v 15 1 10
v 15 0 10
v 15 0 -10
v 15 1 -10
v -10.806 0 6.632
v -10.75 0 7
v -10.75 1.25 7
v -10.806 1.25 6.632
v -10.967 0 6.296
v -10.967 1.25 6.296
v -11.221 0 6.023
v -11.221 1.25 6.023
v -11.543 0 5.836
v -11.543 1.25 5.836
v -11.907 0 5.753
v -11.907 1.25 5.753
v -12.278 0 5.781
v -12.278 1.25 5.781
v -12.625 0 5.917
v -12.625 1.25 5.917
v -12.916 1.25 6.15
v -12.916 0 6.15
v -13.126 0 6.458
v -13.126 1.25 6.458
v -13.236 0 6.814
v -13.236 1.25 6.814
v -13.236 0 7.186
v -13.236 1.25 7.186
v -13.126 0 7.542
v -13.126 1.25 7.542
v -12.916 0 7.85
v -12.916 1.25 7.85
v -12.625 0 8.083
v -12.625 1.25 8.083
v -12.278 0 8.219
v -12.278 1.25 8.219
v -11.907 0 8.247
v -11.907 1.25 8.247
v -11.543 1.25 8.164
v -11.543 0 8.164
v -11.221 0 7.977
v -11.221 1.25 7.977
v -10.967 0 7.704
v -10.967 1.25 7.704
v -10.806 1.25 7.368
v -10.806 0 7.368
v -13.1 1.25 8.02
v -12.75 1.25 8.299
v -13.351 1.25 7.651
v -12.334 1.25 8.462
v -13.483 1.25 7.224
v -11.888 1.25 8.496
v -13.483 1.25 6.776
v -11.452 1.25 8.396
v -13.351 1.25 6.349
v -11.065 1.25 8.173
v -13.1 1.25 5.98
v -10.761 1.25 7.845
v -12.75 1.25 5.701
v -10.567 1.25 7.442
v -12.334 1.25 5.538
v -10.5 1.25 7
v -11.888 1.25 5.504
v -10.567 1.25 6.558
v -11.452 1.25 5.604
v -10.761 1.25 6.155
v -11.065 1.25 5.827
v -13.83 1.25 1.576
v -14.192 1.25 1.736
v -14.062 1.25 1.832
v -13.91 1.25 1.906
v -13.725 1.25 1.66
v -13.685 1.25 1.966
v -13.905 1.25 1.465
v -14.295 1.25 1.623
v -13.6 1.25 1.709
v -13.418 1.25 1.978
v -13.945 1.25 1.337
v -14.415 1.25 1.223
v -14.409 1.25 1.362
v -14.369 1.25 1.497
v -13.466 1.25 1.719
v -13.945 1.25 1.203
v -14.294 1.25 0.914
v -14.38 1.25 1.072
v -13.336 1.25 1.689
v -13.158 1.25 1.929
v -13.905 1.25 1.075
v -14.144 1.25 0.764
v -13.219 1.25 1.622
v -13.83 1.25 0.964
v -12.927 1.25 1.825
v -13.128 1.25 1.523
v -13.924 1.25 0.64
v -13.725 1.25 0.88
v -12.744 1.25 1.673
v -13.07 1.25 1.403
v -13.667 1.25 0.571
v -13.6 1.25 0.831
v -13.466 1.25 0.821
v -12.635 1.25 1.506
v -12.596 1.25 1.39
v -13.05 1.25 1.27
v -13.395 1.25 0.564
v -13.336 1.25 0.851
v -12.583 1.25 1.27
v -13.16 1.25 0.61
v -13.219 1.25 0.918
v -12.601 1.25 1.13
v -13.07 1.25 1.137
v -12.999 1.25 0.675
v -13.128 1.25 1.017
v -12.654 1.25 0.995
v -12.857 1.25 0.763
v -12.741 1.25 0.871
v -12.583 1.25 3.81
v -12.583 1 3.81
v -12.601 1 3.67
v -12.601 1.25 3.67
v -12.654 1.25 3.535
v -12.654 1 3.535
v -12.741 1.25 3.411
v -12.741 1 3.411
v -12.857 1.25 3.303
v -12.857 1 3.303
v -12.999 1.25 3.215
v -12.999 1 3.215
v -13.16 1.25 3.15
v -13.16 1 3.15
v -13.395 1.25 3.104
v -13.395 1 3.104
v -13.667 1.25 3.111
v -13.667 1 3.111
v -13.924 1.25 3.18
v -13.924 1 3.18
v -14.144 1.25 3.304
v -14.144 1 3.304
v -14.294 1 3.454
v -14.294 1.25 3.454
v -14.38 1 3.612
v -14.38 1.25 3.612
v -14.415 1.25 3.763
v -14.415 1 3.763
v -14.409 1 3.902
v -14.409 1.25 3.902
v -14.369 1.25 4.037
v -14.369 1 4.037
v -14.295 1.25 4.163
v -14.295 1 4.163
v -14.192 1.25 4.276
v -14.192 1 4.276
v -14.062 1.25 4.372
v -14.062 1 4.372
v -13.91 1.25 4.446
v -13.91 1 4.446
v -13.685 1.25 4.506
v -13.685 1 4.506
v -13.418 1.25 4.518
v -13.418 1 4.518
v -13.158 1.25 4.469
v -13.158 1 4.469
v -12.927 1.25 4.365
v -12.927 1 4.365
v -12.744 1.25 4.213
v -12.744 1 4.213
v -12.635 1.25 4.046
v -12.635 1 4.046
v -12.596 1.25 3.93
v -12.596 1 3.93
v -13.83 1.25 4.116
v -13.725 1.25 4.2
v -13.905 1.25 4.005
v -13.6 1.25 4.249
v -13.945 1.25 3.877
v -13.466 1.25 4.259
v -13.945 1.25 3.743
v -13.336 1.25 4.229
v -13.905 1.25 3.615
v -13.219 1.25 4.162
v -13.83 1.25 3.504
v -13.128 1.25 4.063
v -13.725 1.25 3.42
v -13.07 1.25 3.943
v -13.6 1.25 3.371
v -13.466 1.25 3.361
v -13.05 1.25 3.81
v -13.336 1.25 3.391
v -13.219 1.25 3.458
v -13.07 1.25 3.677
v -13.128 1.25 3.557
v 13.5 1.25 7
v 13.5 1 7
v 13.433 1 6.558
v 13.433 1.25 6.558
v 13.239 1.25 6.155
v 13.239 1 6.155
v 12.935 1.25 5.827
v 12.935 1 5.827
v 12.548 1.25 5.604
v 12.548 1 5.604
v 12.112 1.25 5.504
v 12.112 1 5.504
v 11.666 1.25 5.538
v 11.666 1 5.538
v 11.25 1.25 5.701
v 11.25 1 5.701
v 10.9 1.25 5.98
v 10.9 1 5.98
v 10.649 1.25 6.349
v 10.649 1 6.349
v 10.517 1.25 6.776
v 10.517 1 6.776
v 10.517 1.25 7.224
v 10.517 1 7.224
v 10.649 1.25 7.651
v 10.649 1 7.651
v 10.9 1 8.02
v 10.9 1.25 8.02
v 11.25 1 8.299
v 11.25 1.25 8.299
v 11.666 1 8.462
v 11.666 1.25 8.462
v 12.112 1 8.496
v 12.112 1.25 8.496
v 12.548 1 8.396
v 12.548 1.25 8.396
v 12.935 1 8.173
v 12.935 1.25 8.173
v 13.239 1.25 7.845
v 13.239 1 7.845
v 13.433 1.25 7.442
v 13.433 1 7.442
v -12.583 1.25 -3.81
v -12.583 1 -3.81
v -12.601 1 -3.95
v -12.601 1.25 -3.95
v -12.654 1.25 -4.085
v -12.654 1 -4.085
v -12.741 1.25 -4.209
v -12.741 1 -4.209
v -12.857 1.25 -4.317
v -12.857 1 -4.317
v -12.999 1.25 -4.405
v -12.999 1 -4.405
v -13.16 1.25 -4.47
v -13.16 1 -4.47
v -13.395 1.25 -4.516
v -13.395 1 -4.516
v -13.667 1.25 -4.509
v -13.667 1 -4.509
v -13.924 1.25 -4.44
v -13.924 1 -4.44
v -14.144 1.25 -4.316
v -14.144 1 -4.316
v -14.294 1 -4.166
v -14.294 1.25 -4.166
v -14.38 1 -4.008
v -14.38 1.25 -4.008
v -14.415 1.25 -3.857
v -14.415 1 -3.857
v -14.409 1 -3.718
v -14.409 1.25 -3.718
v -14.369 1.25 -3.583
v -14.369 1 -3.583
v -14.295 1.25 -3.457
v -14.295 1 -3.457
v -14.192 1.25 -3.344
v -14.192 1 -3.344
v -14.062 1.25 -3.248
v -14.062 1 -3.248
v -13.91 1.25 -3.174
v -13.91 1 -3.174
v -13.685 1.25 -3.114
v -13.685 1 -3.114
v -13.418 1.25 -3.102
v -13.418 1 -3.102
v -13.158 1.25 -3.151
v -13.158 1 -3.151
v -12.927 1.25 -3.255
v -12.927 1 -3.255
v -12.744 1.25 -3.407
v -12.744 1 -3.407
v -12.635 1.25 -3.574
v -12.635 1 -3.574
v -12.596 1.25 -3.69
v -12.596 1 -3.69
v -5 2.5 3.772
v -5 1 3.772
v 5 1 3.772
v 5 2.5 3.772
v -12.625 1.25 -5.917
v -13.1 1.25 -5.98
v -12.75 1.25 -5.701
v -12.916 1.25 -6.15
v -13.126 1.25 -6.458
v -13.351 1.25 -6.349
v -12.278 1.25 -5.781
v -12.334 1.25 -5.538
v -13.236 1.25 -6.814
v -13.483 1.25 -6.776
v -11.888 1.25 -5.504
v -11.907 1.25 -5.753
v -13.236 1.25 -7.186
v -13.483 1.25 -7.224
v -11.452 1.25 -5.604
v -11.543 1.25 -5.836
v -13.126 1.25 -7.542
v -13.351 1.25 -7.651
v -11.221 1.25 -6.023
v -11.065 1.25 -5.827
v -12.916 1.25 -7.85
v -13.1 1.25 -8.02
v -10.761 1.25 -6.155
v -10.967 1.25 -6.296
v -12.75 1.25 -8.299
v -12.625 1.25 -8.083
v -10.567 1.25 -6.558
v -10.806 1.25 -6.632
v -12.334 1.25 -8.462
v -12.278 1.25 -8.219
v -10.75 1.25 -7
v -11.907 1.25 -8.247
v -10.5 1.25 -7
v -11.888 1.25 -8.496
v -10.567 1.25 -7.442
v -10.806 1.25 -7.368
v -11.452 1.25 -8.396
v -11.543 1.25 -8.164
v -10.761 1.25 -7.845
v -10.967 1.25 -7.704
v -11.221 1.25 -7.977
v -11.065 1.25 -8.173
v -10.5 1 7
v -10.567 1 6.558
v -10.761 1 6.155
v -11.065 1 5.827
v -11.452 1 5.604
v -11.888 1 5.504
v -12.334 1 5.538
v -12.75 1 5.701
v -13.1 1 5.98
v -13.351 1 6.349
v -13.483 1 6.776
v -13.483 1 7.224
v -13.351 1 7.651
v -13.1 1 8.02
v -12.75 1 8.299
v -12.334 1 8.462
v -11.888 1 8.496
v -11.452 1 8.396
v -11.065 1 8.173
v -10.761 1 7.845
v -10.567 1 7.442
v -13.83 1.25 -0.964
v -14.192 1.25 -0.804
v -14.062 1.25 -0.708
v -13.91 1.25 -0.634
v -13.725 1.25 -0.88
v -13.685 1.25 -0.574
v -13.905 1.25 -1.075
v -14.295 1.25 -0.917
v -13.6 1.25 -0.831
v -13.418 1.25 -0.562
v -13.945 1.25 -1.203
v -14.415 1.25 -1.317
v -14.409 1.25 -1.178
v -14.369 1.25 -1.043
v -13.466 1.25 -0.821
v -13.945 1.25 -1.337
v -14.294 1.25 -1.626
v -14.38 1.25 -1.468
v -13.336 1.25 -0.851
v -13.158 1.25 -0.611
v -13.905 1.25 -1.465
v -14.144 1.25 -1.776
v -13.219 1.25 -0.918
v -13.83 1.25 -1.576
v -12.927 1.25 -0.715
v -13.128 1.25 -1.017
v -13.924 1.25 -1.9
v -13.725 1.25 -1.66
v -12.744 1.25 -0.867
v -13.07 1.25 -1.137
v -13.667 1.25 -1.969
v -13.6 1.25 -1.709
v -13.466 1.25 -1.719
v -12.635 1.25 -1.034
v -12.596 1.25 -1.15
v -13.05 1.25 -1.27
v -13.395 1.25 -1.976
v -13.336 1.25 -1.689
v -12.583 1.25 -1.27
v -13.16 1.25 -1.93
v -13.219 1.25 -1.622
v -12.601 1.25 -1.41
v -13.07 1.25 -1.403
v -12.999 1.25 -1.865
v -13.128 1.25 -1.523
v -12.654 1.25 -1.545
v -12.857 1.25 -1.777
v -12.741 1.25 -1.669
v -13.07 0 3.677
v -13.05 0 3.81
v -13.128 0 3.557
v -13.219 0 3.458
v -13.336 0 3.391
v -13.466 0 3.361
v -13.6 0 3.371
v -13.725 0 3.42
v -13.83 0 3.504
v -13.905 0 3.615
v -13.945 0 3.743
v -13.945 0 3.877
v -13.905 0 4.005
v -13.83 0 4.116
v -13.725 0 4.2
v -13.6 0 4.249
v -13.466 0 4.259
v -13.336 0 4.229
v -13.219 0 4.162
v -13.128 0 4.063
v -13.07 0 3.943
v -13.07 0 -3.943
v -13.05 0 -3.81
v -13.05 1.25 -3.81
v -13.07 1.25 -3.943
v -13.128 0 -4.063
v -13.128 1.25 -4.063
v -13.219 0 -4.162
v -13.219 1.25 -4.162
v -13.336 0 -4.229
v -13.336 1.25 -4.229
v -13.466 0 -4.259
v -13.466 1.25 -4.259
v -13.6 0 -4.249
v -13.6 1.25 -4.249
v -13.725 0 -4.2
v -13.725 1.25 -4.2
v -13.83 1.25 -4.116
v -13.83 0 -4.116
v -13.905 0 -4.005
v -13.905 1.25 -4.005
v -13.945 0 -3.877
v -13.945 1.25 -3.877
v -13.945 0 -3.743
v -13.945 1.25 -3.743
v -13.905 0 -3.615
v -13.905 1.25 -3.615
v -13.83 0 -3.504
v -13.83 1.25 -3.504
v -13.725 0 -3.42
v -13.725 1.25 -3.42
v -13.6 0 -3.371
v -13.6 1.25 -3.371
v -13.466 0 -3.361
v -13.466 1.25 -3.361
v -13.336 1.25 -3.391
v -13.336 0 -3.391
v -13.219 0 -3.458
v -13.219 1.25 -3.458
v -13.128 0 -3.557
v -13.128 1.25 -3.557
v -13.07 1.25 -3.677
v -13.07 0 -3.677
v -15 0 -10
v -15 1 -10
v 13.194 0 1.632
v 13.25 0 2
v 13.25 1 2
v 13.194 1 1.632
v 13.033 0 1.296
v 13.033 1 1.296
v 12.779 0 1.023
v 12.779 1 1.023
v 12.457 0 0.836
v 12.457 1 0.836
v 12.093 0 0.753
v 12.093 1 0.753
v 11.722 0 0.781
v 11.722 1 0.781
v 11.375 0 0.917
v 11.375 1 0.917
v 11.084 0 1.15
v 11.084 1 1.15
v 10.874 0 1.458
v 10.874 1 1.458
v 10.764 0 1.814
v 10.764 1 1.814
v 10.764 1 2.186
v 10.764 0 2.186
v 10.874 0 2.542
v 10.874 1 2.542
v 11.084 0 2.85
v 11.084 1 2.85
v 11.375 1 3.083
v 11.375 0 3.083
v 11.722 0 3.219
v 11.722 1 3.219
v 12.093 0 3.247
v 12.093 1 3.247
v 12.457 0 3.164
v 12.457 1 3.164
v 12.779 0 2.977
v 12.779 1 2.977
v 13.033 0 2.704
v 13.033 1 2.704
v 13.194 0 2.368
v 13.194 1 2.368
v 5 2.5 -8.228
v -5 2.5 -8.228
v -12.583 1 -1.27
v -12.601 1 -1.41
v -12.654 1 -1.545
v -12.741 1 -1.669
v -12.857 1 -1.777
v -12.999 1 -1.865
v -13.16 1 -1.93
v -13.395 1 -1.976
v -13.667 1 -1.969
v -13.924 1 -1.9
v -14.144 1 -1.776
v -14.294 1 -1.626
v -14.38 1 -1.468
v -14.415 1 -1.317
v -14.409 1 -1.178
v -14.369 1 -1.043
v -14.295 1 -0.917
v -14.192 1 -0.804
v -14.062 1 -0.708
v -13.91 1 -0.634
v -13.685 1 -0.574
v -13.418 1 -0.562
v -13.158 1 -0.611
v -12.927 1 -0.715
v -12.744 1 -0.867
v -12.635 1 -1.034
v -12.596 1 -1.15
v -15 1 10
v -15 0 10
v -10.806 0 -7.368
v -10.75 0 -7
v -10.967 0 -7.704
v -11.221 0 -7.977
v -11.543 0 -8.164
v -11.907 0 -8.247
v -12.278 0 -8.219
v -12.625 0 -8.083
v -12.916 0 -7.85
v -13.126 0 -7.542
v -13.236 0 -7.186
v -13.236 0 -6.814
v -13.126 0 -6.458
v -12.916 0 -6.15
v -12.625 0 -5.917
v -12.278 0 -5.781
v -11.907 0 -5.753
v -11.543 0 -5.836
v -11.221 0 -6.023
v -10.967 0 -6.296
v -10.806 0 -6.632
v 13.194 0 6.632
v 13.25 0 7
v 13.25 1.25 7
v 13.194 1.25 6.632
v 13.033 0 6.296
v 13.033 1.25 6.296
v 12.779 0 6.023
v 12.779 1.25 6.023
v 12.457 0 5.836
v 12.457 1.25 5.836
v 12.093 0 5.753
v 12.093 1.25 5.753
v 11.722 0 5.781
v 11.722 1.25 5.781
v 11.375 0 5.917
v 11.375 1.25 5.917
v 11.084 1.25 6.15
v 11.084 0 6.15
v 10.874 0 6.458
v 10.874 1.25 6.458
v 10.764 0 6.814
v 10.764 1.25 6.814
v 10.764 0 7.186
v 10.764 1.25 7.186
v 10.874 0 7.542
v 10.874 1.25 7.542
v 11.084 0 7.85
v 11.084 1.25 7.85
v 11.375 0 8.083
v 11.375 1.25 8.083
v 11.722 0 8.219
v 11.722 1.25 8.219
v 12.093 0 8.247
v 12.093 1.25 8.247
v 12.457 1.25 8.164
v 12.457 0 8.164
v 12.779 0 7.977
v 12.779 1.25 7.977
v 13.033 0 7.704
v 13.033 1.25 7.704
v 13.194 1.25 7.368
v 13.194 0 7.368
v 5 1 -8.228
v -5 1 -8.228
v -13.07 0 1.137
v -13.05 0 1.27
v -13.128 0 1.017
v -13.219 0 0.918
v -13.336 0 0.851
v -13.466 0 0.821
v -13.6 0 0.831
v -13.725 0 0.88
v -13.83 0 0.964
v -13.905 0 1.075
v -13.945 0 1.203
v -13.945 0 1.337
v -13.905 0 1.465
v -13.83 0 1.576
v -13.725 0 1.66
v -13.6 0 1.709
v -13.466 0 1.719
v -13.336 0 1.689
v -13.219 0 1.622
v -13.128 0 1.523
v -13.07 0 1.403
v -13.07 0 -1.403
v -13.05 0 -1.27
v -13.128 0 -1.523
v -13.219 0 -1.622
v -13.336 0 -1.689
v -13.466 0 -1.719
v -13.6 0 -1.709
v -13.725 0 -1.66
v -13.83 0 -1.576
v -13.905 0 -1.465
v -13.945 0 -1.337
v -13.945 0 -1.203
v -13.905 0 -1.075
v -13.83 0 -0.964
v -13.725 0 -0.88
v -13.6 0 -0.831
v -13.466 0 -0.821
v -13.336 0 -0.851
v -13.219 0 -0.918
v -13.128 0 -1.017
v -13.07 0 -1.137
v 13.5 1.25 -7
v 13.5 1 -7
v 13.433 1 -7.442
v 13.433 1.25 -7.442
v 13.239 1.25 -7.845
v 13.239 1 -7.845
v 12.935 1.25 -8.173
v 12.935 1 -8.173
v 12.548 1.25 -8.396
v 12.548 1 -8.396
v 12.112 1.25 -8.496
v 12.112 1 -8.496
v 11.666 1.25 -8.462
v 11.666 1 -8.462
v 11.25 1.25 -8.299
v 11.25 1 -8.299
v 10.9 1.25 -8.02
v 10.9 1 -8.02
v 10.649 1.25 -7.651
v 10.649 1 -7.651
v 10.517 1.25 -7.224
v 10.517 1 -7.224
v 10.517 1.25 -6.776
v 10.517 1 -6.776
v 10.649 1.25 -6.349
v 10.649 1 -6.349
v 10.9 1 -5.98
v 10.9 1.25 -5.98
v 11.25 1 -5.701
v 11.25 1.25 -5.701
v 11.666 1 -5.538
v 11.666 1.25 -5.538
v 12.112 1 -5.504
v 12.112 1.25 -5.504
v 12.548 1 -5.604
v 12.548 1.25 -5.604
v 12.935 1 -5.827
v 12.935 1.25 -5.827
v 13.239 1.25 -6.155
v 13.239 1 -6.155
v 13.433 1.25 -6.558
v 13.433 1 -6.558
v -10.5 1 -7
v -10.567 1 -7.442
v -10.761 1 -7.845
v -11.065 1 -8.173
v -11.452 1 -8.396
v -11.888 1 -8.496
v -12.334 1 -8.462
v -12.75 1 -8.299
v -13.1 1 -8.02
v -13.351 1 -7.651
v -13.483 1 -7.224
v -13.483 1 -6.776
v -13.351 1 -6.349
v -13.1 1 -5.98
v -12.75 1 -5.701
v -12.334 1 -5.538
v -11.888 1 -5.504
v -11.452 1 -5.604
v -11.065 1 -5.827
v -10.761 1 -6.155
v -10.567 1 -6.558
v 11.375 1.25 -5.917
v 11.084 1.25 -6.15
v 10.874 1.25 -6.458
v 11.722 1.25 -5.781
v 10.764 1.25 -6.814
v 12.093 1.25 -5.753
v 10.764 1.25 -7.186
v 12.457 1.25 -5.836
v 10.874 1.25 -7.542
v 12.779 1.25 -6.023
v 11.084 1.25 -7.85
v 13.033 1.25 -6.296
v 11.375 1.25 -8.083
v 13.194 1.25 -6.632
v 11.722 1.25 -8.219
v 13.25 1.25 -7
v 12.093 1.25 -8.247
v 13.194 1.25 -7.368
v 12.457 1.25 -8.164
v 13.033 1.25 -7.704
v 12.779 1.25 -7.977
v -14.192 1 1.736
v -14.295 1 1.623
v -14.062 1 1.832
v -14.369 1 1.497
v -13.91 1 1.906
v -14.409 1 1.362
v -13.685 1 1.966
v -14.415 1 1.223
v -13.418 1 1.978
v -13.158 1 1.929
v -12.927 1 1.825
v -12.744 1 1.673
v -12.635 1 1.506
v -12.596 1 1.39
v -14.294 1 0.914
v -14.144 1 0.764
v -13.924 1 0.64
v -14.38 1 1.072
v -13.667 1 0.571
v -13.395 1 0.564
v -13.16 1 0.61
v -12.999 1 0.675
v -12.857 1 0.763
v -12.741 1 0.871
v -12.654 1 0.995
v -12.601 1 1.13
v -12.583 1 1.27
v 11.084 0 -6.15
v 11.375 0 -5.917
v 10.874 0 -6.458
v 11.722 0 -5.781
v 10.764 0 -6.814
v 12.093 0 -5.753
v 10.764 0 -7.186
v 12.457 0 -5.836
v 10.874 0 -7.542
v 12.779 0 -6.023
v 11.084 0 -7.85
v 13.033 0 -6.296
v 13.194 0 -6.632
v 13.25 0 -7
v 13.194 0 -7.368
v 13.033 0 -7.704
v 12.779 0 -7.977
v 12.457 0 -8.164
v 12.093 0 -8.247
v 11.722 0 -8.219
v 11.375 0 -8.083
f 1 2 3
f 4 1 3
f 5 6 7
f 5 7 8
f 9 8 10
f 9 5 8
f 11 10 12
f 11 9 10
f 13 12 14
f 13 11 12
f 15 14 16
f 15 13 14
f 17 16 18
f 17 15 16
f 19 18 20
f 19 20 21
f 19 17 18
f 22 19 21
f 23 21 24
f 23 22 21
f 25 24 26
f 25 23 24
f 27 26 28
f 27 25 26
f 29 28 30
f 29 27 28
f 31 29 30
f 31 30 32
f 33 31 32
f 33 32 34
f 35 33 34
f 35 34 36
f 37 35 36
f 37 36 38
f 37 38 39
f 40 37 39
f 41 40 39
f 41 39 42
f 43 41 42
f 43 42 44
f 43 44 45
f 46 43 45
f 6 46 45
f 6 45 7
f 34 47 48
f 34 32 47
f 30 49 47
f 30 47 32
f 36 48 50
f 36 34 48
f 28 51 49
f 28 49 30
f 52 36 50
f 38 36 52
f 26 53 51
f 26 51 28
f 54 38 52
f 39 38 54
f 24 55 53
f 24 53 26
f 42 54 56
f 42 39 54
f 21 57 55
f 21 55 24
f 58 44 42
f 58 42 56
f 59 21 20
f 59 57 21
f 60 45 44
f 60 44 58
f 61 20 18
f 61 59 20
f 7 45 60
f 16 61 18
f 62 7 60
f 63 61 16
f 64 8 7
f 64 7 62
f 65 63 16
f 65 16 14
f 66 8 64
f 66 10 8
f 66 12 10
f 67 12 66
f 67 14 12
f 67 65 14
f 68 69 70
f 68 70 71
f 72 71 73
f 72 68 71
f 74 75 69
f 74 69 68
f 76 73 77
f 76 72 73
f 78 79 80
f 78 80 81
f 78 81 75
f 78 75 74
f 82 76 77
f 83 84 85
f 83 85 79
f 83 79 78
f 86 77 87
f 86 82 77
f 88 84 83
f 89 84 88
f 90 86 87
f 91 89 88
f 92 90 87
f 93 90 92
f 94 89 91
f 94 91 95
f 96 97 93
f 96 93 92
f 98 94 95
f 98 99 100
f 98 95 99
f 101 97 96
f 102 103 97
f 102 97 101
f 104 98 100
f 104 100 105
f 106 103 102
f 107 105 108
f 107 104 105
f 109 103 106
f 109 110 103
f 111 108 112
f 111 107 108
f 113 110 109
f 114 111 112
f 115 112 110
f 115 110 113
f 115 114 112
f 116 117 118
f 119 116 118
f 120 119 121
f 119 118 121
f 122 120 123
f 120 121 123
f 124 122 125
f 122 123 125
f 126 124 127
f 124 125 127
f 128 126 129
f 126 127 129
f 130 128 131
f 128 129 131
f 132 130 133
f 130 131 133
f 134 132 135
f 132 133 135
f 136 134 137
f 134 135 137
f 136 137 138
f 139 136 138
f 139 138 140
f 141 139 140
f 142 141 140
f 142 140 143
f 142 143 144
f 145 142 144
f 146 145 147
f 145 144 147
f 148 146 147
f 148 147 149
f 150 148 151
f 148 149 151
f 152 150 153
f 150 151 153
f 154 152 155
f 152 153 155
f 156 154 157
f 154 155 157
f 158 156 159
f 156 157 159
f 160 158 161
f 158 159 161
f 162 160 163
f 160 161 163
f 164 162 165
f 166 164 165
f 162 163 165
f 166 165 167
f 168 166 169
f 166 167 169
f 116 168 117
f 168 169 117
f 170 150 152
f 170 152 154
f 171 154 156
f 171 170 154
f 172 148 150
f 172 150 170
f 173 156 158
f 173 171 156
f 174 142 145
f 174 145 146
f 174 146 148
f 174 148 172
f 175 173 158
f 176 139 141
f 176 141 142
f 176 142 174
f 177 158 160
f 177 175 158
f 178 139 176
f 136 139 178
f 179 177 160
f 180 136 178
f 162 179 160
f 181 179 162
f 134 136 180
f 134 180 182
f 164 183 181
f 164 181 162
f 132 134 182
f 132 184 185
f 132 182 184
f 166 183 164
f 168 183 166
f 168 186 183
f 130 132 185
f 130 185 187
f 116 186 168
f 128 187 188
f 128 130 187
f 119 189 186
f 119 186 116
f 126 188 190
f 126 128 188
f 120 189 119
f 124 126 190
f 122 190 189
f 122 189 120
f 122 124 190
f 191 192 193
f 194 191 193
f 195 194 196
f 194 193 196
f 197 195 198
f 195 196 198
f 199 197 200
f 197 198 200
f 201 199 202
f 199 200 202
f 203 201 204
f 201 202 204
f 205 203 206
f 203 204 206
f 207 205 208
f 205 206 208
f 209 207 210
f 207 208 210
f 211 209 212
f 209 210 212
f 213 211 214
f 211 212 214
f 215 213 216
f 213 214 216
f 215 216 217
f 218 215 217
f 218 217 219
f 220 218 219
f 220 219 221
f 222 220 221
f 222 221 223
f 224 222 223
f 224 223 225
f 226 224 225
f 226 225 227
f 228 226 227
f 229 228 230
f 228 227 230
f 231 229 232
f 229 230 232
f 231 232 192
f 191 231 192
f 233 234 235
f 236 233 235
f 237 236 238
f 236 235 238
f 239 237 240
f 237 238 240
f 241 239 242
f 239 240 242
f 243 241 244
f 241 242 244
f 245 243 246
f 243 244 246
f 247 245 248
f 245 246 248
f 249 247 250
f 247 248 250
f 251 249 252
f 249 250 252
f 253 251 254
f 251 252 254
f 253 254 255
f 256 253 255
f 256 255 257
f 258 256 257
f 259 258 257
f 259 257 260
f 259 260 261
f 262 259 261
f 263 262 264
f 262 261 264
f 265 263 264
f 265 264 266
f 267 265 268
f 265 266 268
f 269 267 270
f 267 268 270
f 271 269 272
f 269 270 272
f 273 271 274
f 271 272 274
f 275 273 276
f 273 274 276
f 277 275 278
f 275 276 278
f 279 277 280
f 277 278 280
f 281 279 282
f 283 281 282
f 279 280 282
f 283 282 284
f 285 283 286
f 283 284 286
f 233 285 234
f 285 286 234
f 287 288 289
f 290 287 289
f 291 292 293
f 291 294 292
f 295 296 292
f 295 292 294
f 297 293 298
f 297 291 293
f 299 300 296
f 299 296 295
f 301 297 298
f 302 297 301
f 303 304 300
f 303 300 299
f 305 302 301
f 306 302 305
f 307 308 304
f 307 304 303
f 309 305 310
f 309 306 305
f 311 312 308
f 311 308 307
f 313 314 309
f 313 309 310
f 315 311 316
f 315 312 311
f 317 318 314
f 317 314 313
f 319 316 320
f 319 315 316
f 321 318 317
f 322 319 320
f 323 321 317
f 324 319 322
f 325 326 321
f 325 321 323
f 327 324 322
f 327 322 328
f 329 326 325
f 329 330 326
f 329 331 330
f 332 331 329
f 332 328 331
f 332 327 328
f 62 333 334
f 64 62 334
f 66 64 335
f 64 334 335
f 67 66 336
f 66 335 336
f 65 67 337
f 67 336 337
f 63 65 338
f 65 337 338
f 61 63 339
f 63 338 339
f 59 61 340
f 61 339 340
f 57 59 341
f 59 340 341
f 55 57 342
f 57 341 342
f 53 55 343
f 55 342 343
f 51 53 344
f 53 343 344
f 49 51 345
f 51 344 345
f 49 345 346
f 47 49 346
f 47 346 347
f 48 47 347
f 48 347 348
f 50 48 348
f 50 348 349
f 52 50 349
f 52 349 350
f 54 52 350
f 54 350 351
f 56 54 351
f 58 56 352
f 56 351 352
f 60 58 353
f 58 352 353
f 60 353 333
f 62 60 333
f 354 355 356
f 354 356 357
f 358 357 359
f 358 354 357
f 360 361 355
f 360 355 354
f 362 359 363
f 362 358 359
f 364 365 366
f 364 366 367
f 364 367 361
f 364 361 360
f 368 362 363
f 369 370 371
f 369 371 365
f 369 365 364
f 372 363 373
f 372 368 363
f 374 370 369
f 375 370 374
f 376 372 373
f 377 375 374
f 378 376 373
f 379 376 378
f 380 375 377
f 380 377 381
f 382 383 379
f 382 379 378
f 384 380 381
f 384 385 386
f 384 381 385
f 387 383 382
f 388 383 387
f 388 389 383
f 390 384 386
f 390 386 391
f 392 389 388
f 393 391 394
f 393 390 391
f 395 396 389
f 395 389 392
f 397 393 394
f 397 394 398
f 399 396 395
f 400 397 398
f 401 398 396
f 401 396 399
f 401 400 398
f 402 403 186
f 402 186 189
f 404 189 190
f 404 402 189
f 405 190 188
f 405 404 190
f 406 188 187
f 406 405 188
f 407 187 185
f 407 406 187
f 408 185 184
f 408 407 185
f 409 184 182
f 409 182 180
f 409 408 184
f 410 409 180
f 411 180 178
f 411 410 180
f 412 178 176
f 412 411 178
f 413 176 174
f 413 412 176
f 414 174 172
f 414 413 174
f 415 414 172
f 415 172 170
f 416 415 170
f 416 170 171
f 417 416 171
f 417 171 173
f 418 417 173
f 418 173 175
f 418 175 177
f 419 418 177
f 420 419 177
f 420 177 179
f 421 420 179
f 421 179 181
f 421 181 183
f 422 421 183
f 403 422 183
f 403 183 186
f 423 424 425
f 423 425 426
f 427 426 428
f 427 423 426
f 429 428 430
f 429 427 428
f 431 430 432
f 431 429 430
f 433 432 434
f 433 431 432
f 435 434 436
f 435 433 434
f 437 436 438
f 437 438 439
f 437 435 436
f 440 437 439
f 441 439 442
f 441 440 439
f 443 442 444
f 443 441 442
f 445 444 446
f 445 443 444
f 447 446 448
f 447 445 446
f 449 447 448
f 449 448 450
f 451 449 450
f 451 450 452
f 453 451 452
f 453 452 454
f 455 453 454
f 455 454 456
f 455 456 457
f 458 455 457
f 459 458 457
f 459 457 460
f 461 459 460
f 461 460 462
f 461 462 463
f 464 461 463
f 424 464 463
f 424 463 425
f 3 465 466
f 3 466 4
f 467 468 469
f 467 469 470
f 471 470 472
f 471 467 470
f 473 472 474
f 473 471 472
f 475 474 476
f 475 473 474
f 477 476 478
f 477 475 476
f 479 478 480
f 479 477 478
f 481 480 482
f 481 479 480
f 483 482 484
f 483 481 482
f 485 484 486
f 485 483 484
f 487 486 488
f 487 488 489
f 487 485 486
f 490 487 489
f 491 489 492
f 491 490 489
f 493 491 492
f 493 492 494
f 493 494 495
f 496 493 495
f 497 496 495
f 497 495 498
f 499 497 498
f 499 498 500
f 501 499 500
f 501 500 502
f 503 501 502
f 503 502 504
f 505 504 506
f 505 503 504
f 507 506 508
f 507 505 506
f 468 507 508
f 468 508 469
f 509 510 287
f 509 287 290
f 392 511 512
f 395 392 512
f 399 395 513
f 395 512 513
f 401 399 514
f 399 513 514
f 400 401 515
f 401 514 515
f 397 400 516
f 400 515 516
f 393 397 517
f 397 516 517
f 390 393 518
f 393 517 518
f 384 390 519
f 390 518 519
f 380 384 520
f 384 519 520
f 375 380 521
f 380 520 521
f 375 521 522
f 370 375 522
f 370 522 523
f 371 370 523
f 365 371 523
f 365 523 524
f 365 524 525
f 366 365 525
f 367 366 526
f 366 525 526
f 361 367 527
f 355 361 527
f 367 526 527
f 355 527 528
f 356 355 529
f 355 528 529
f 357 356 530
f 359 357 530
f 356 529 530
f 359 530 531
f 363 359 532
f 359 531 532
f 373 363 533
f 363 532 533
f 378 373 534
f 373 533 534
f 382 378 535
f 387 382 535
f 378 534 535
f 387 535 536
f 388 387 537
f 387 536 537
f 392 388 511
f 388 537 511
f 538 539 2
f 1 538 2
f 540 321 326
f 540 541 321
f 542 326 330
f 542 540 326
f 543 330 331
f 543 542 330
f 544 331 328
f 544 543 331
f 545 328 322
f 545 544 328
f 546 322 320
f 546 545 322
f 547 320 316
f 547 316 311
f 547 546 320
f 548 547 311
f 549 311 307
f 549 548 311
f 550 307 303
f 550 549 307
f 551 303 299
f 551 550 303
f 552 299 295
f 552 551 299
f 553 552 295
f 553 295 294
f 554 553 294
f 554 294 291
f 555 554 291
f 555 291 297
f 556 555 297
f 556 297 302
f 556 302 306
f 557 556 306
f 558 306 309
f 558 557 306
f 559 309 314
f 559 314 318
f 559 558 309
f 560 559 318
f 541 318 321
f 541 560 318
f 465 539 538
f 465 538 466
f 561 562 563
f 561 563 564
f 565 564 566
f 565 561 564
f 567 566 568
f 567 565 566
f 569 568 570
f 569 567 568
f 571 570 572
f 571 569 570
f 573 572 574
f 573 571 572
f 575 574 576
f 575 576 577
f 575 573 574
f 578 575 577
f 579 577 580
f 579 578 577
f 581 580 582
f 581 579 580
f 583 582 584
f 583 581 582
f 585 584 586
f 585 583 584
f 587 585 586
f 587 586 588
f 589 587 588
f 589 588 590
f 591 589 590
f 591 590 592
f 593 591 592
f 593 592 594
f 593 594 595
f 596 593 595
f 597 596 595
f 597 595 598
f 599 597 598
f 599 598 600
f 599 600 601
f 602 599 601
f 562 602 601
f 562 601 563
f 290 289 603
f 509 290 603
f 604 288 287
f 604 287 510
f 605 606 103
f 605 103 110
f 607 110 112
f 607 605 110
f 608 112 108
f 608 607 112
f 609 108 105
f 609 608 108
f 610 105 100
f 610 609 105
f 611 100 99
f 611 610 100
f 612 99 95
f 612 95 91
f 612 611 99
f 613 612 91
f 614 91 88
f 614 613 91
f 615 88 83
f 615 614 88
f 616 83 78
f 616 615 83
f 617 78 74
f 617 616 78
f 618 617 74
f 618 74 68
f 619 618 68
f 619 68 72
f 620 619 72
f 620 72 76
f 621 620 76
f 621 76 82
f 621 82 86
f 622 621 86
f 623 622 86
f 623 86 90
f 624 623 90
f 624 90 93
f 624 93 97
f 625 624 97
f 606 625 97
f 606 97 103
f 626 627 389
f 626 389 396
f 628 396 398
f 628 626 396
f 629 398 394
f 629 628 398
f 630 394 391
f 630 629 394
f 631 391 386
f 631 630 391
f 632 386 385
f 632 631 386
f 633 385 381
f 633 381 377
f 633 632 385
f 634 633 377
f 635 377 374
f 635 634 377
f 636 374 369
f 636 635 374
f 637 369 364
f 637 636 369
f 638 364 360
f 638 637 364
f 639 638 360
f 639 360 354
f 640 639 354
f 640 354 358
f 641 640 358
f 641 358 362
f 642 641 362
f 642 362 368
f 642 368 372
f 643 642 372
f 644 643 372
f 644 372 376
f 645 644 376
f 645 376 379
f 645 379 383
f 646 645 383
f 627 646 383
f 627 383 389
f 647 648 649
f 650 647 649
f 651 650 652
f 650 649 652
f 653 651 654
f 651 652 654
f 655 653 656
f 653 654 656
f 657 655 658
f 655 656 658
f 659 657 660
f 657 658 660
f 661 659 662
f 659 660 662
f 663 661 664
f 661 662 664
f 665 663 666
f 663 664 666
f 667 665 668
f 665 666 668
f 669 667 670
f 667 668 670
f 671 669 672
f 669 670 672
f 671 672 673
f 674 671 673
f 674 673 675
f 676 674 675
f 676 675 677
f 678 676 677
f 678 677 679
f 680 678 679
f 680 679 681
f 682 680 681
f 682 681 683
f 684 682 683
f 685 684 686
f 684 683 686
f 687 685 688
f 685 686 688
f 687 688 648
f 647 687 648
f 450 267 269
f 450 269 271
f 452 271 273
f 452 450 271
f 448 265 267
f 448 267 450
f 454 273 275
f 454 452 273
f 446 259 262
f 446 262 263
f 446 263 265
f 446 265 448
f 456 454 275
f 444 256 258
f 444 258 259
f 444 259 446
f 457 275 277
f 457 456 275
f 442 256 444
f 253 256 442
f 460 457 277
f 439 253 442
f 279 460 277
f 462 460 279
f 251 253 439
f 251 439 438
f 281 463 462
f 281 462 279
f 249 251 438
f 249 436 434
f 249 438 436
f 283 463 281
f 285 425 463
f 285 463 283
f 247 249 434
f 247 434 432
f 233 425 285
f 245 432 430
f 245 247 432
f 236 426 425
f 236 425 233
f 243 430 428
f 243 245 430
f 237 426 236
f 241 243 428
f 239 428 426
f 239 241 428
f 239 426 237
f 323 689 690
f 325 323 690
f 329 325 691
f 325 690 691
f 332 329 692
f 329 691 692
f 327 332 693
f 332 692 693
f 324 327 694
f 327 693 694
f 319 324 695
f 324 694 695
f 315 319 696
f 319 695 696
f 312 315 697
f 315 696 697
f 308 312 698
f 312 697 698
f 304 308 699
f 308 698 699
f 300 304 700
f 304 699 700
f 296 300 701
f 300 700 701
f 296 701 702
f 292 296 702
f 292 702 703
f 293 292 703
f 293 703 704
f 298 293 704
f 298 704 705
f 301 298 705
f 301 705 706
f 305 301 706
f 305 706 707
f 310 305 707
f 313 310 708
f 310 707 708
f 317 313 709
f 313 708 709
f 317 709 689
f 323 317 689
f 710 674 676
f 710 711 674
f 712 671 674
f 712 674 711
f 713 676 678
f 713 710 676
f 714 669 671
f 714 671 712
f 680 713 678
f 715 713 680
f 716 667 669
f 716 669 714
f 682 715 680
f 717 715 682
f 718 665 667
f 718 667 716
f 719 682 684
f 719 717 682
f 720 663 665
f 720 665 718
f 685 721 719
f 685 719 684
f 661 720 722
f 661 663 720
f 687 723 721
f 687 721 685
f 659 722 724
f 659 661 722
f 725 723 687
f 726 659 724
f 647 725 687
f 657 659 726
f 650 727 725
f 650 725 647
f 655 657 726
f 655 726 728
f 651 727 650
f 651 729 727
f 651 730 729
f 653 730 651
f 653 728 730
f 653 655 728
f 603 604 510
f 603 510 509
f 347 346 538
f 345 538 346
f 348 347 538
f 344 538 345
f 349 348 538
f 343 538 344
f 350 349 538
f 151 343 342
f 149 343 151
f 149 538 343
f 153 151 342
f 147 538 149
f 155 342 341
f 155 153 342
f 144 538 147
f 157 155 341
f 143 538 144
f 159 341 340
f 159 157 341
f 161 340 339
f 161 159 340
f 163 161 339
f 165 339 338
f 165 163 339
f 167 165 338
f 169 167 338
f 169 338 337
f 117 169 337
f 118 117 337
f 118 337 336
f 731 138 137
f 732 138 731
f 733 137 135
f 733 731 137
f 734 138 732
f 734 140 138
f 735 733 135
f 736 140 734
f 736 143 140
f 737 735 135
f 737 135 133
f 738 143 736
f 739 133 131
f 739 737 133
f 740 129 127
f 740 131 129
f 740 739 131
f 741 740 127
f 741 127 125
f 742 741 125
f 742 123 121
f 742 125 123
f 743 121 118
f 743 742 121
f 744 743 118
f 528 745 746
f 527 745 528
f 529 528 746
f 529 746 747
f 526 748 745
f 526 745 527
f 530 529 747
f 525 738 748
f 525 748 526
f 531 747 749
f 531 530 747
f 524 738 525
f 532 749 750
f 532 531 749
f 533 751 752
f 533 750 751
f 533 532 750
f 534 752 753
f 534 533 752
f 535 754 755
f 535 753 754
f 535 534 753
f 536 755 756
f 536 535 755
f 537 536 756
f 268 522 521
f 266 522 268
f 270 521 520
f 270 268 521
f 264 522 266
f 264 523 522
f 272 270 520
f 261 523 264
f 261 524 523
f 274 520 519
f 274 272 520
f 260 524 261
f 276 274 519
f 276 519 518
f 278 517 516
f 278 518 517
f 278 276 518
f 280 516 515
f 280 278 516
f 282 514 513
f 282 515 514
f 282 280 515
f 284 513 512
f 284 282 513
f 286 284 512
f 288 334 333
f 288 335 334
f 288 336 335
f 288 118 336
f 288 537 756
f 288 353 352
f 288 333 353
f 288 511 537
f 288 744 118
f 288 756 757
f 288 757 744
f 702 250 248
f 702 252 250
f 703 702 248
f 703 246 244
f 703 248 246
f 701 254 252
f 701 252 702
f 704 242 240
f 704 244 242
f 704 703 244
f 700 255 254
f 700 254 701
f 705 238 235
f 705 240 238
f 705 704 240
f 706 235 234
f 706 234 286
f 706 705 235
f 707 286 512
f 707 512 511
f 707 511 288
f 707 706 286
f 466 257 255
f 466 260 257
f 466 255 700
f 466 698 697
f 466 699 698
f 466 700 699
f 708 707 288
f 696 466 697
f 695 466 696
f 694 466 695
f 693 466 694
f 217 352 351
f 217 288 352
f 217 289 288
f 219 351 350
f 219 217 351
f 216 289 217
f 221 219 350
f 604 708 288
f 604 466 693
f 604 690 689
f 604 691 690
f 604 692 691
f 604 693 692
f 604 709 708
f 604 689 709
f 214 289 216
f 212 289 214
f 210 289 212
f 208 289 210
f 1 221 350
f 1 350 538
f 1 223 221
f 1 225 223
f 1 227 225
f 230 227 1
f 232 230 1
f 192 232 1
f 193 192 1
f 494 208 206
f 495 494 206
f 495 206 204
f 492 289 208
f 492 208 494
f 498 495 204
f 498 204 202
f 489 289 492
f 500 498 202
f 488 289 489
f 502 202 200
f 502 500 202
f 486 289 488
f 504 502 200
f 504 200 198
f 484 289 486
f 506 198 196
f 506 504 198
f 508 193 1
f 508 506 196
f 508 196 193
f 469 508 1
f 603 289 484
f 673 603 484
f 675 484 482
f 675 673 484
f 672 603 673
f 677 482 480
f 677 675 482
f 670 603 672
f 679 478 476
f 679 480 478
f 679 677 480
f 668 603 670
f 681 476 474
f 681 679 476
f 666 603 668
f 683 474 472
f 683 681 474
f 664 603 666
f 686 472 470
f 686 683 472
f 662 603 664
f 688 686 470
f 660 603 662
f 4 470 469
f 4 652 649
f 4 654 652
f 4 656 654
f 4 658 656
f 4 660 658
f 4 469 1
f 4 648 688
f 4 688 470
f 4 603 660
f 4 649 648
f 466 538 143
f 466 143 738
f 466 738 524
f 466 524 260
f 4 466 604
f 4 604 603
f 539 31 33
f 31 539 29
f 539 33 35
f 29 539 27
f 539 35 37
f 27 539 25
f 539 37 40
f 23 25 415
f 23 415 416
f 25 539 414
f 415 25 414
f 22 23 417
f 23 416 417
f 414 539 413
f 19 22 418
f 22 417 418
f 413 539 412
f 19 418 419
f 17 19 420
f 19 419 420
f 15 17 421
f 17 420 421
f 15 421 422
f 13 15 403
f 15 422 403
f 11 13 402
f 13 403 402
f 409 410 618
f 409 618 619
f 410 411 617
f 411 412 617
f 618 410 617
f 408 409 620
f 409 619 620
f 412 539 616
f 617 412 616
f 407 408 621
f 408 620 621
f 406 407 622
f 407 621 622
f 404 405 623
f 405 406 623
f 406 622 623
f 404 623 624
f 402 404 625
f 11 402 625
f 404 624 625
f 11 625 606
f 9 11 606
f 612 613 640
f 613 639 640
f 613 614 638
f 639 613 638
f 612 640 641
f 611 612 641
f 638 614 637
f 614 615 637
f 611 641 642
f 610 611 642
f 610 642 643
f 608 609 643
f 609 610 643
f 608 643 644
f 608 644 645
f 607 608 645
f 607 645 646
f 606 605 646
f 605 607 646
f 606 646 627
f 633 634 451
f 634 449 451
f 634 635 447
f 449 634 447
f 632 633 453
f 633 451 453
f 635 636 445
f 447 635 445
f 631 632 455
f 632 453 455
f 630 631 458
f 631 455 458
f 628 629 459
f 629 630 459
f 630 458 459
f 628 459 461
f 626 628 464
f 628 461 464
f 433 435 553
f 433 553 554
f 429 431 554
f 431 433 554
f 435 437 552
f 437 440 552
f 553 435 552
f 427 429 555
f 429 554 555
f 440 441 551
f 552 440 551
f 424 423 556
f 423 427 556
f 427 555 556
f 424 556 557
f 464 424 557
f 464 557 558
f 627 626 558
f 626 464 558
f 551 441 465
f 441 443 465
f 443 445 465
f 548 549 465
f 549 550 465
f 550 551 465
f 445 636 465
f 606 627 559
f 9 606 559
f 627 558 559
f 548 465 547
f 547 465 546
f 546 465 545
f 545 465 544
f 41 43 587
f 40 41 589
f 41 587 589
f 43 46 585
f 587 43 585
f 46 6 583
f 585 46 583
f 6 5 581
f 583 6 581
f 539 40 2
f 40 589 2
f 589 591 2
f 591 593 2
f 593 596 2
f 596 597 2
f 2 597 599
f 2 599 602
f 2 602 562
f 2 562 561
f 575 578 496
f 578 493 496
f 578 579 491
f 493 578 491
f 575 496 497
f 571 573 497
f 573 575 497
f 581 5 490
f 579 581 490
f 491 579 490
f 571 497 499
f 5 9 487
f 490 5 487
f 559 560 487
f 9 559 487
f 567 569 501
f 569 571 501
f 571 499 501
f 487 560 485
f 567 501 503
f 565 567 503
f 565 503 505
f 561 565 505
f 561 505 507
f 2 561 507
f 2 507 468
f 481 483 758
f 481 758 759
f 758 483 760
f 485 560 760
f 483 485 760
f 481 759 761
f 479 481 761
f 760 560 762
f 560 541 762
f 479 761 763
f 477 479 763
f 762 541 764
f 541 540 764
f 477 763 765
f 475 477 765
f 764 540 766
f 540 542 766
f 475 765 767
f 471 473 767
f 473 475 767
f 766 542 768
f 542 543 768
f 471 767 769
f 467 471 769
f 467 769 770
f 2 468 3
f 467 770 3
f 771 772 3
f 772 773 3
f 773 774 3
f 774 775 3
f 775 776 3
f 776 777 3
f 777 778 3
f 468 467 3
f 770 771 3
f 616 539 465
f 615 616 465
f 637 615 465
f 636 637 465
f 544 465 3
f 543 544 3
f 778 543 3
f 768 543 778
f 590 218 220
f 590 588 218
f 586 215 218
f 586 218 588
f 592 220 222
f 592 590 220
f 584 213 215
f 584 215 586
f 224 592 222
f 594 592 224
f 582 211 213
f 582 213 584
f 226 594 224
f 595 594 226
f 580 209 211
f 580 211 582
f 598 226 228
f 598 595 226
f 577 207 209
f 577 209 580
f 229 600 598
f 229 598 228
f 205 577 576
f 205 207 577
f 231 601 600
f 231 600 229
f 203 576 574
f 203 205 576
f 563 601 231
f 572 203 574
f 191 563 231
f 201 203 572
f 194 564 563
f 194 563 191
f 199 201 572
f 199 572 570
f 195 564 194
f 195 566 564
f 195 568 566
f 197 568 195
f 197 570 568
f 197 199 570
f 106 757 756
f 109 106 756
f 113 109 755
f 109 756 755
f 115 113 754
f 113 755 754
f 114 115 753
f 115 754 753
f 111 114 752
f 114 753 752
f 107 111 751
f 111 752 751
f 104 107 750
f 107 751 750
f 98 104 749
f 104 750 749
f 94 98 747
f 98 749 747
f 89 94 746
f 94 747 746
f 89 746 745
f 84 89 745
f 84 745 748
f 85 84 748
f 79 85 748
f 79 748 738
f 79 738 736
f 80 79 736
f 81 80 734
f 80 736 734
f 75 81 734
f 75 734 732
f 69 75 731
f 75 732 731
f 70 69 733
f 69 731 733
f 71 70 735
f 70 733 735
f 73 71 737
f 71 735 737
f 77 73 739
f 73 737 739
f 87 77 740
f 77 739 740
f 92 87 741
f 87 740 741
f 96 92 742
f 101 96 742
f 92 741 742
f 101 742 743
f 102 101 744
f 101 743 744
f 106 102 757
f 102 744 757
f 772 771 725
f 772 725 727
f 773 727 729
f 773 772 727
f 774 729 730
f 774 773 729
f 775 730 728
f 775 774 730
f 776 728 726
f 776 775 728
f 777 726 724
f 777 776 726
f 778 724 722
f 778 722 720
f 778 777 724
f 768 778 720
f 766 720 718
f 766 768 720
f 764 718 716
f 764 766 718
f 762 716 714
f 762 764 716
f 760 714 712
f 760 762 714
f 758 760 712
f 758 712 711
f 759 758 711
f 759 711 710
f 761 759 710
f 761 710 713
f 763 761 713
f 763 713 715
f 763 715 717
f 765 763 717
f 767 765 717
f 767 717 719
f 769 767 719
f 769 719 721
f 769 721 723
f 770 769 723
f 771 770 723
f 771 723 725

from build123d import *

# Parameters (mm, degrees)
SKETCH1_W               = 30
SKETCH1_H               = 20
SKETCH1_R               = 1.25
BOSS_EXTRUDE1_DEPTH     = 1
SKETCH2_W               = 10
SKETCH2_H               = 12
BOSS_EXTRUDE2_DEPTH     = 2.5
SKETCH3_R               = 1.5
SKETCH3_R_2             = 1.25
SKETCH3_RX              = 0.916848001
SKETCH3_RY              = 0.710785017
SKETCH3_R_3             = 0.45
BOSS_EXTRUDE3_DEPTH     = 0.25
SKETCH4_R               = 0.45
CUT_EXTRUDE1_DEPTH      = 3.5
CUT_EXTRUDE1_DEPTH_BACK = 5


with BuildPart() as part:
    # Sketch1 → Boss-Extrude1 (new body)
    with BuildSketch(Plane(origin=(0, 0, 0), x_dir=(1, 0, 0), z_dir=(0, 1, 0))):
        Rectangle(SKETCH1_W, SKETCH1_H)
        with Locations((-12, 7)):
            Circle(SKETCH1_R, mode=Mode.SUBTRACT)
        with Locations((12, 7)):
            Circle(SKETCH1_R, mode=Mode.SUBTRACT)
        with Locations((12, -7)):
            Circle(SKETCH1_R, mode=Mode.SUBTRACT)
        with Locations((-12, -7)):
            Circle(SKETCH1_R, mode=Mode.SUBTRACT)
        with Locations((12, -2)):
            Circle(SKETCH1_R, mode=Mode.SUBTRACT)
    extrude(amount=BOSS_EXTRUDE1_DEPTH)

    # Sketch2 → Boss-Extrude2 (add)
    with BuildSketch(Plane(origin=(0, 0, 0), x_dir=(1, 0, 0), z_dir=(0, 1, 0))):
        with Locations((0, 2.22835765)):
            Rectangle(SKETCH2_W, SKETCH2_H)
    extrude(amount=BOSS_EXTRUDE2_DEPTH)

    # Sketch3 → Boss-Extrude3 (add)
    with BuildSketch(Plane(origin=(0, 1, 0), x_dir=(1, 0, 0), z_dir=(0, 1, 0))):
        with Locations((-12, 7)):
            Circle(SKETCH3_R)
        with Locations((-12, 7)):
            Circle(SKETCH3_R_2, mode=Mode.SUBTRACT)
        with Locations((12, 7)):
            Circle(SKETCH3_R)
        with Locations((12, 7)):
            Circle(SKETCH3_R_2, mode=Mode.SUBTRACT)
        with Locations((12, -7)):
            Circle(SKETCH3_R)
        with Locations((12, -7)):
            Circle(SKETCH3_R_2, mode=Mode.SUBTRACT)
        with Locations((-12, -7)):
            Circle(SKETCH3_R)
        with Locations((-12, -7)):
            Circle(SKETCH3_R_2, mode=Mode.SUBTRACT)
        with Locations((-13.5, 3.81)):
            Ellipse(SKETCH3_RX, SKETCH3_RY)
        with Locations((-13.5, 3.81)):
            Circle(SKETCH3_R_3, mode=Mode.SUBTRACT)
        with Locations((-13.5, 1.27)):
            Ellipse(SKETCH3_RX, SKETCH3_RY)
        with Locations((-13.5, 1.27)):
            Circle(SKETCH3_R_3, mode=Mode.SUBTRACT)
        with Locations((-13.5, -1.27)):
            Ellipse(SKETCH3_RX, SKETCH3_RY)
        with Locations((-13.5, -1.27)):
            Circle(SKETCH3_R_3, mode=Mode.SUBTRACT)
        with Locations((-13.5, -3.81)):
            Ellipse(SKETCH3_RX, SKETCH3_RY)
        with Locations((-13.5, -3.81)):
            Circle(SKETCH3_R_3, mode=Mode.SUBTRACT)
    extrude(amount=BOSS_EXTRUDE3_DEPTH)

    # Sketch4 → Cut-Extrude1 (cut, two sides)
    with BuildSketch(Plane(origin=(0, 0, 0), x_dir=(1, 0, 0), z_dir=(0, 1, 0))) as cut_extrude1_sk:
        with Locations((-13.5, 3.81)):
            Circle(SKETCH4_R)
        with Locations((-13.5, 1.27)):
            Circle(SKETCH4_R)
        with Locations((-13.5, -1.27)):
            Circle(SKETCH4_R)
        with Locations((-13.5, -3.81)):
            Circle(SKETCH4_R)
    extrude(amount=CUT_EXTRUDE1_DEPTH, mode=Mode.SUBTRACT)
    extrude(cut_extrude1_sk.sketch, amount=-CUT_EXTRUDE1_DEPTH_BACK, mode=Mode.SUBTRACT)


solid = part.part
